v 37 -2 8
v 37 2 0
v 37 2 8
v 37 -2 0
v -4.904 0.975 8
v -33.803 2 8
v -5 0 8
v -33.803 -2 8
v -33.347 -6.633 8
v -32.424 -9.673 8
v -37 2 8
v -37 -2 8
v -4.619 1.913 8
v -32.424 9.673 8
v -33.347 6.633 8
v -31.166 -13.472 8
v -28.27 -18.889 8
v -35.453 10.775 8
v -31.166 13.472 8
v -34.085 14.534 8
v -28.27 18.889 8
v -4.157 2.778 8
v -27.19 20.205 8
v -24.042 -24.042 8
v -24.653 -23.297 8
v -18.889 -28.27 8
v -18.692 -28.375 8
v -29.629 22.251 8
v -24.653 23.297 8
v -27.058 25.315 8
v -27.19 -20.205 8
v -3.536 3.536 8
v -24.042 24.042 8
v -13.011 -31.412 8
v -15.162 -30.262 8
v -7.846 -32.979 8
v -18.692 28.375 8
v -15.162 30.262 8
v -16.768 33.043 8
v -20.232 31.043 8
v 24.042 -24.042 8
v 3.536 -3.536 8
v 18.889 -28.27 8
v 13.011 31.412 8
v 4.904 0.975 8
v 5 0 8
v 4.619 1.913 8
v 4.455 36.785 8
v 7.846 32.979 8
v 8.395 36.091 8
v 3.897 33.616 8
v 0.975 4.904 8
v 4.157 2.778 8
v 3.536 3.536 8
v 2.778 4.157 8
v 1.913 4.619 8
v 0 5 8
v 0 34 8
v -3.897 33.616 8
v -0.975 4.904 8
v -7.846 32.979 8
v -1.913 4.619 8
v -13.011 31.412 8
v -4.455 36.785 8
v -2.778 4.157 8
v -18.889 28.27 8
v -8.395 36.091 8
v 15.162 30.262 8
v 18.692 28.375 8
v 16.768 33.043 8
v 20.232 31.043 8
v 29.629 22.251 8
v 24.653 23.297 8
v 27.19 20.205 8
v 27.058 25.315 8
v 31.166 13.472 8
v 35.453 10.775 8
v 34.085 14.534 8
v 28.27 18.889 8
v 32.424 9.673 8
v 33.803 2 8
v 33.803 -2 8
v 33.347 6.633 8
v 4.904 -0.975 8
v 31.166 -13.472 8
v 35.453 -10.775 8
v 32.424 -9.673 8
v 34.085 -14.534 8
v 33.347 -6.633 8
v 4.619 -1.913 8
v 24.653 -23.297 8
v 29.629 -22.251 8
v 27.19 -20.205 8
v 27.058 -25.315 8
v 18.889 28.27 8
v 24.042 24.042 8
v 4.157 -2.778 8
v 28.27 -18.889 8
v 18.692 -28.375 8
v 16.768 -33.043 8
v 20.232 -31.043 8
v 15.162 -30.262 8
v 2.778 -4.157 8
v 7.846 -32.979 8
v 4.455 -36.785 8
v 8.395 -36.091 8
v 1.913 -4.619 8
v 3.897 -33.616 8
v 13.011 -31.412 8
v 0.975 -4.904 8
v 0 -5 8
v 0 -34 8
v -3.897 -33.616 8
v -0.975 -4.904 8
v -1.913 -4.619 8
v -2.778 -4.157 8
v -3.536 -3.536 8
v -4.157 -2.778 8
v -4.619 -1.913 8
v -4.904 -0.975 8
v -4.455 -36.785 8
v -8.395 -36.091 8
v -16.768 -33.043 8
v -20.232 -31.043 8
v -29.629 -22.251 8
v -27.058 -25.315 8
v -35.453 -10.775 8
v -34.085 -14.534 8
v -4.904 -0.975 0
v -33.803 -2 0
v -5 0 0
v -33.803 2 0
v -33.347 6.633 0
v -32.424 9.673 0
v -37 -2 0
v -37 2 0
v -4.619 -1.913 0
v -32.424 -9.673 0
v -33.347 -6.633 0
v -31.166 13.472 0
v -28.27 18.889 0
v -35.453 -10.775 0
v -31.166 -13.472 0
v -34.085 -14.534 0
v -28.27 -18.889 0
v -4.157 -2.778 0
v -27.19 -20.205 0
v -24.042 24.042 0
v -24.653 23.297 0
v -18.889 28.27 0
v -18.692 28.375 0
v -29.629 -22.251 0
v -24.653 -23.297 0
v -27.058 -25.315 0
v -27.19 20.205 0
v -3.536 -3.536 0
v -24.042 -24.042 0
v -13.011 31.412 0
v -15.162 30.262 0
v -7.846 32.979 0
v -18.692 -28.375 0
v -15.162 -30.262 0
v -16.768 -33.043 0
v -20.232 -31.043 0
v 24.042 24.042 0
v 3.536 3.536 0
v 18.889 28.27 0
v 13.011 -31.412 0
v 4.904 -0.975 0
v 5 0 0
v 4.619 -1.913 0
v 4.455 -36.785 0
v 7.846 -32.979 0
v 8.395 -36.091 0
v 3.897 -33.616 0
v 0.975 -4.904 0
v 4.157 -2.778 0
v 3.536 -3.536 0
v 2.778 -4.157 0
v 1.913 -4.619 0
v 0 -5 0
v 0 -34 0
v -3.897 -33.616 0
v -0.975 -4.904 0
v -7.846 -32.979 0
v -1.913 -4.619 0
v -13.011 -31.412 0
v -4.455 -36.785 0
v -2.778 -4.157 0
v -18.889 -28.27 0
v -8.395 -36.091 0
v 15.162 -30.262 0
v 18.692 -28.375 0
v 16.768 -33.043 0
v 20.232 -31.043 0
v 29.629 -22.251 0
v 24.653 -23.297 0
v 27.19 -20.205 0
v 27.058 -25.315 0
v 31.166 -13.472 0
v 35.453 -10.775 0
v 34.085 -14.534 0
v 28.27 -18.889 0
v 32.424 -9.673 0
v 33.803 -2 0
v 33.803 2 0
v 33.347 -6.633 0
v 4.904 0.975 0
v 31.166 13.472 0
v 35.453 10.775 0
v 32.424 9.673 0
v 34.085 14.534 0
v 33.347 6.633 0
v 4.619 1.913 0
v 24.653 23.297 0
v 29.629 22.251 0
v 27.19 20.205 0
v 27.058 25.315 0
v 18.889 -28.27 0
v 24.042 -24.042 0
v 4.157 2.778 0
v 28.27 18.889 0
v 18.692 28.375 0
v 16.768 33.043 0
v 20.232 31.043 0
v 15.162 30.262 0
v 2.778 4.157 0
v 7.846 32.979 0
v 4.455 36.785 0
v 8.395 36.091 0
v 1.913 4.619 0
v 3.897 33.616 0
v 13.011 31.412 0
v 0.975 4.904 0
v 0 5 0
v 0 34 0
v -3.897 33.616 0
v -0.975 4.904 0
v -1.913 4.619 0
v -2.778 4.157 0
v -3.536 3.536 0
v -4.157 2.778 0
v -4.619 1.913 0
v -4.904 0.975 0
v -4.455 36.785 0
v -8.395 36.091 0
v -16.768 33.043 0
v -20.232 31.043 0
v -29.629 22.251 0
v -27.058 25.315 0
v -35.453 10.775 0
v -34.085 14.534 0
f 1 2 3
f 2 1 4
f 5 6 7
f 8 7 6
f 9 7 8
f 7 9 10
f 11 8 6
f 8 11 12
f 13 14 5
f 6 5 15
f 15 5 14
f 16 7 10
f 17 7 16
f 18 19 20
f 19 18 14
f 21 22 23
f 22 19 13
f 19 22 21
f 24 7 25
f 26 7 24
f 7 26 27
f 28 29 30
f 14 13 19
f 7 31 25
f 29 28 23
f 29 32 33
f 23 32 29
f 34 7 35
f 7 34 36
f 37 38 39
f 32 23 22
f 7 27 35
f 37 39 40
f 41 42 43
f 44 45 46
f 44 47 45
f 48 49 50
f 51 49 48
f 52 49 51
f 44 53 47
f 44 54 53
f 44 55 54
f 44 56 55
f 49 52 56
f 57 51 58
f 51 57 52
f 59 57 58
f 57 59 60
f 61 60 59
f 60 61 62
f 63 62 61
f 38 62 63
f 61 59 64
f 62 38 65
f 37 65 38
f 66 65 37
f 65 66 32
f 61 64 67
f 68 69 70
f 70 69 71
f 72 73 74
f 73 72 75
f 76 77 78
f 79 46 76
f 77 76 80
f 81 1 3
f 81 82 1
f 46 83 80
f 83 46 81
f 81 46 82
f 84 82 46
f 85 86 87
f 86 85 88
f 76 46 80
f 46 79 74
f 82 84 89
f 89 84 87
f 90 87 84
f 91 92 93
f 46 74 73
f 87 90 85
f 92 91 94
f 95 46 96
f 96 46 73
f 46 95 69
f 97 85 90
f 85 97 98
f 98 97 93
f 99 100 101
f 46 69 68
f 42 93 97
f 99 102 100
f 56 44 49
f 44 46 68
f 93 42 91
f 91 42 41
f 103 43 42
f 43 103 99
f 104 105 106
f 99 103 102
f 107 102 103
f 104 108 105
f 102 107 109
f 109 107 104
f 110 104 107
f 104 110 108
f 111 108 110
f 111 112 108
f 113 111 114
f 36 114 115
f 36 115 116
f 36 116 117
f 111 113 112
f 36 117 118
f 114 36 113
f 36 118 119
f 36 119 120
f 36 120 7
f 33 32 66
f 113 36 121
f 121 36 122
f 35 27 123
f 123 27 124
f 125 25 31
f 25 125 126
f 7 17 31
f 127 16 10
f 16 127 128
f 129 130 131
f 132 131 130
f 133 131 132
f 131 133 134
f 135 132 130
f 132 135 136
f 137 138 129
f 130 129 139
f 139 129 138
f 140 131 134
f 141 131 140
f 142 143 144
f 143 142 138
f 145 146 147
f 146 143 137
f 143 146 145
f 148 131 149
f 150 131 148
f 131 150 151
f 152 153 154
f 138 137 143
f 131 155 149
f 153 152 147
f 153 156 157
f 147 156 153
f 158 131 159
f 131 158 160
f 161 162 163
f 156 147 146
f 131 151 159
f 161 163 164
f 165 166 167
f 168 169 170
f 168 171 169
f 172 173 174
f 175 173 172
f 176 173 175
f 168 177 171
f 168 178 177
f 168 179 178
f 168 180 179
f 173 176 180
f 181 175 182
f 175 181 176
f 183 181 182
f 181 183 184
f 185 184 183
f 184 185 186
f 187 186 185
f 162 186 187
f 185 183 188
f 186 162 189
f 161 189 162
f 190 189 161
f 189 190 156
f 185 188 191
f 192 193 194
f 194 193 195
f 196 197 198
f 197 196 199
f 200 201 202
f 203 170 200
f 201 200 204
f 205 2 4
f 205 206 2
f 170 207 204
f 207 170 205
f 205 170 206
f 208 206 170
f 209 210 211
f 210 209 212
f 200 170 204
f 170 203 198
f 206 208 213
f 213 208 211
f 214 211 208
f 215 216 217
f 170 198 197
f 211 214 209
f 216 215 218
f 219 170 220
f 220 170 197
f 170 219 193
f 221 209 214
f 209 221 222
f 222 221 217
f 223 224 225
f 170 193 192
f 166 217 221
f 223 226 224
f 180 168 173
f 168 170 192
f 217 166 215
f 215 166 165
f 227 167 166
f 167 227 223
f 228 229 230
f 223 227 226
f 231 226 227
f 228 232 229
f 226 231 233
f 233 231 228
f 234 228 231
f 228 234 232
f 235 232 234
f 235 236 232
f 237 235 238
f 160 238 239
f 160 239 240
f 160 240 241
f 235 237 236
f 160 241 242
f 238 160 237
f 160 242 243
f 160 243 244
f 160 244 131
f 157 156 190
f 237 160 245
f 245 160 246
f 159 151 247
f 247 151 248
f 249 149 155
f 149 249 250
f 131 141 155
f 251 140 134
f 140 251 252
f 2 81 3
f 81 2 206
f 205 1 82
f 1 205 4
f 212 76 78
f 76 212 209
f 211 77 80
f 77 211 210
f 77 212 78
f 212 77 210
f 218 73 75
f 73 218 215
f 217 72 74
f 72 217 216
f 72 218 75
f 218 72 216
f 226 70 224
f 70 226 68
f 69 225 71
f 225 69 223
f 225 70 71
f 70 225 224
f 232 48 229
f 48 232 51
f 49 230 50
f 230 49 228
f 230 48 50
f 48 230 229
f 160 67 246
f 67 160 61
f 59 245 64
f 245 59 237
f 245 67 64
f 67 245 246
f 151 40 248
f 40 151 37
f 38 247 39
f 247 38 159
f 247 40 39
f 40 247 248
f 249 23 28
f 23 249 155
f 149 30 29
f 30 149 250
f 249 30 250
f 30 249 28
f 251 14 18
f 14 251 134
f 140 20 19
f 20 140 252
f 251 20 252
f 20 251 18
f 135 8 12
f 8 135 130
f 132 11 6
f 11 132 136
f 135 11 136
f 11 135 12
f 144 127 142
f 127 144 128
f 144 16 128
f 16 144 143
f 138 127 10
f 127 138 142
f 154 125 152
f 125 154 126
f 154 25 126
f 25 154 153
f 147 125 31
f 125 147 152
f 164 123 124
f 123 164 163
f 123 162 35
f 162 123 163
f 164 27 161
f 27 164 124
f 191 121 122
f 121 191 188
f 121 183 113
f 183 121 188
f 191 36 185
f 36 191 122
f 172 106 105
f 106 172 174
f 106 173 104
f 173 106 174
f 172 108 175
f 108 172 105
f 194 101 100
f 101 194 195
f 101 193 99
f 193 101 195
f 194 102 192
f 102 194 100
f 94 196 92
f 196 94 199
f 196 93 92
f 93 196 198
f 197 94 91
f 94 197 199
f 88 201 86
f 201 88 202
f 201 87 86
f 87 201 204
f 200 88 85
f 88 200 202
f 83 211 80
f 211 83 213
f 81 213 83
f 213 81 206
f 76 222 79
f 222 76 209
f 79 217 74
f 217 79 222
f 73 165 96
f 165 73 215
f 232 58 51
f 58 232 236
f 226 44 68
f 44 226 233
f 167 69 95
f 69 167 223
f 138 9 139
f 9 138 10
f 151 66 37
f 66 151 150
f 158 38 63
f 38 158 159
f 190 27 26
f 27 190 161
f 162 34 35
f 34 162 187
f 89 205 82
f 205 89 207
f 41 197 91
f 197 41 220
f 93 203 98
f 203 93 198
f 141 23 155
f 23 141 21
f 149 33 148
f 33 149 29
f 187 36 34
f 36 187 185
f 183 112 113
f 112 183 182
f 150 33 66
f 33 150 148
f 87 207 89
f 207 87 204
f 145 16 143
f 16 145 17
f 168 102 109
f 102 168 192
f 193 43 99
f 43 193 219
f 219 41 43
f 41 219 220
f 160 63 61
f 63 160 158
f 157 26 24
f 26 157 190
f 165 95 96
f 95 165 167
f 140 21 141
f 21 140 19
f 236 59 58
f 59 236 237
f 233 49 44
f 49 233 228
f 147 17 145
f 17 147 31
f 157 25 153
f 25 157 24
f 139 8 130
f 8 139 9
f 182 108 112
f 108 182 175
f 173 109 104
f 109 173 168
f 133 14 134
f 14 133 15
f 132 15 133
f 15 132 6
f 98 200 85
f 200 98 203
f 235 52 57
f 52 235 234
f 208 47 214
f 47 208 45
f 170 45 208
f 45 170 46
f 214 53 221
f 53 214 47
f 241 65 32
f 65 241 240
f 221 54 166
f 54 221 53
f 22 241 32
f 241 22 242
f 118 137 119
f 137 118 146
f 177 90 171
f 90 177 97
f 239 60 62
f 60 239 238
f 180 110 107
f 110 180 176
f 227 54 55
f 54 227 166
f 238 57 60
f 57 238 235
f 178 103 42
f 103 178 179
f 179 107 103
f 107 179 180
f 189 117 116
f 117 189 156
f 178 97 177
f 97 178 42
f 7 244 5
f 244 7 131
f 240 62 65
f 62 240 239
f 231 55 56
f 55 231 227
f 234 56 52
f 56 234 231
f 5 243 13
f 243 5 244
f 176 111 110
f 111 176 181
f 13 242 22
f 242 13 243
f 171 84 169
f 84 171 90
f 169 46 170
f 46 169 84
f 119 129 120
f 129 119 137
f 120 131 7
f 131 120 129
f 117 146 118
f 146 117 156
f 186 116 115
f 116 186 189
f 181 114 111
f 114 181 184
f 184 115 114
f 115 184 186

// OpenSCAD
$fn = 32;

// ----------------------------------------------------------------------
// Spur blank: bored gear blank
// ----------------------------------------------------------------------

// --- parameters (mm) ---
disc_r = 34;              // blank root radius
disc_t = 8;               // blank thickness
n_teeth = 18;             // stub tooth count
tooth_w = 4;              // tooth width at the root
tooth_h = 3;              // tooth height above the root
bore_r = 5;               // central bore radius

out_r = disc_r + tooth_h;  // tip radius
bbox_x = 74.0;  // measured width over the teeth
bbox_y = 73.57;  // measured depth over the teeth

difference() {
union() {
  cylinder(r = disc_r, h = disc_t);
  for (i = [0 : n_teeth - 1])
    rotate([0, 0, i * 360 / n_teeth])
      translate([disc_r - 1, -tooth_w / 2, 0])
        cube([tooth_h + 1, tooth_w, disc_t]);
}
  translate([0, 0, -1]) cylinder(r = bore_r, h = disc_t + 2);
}
